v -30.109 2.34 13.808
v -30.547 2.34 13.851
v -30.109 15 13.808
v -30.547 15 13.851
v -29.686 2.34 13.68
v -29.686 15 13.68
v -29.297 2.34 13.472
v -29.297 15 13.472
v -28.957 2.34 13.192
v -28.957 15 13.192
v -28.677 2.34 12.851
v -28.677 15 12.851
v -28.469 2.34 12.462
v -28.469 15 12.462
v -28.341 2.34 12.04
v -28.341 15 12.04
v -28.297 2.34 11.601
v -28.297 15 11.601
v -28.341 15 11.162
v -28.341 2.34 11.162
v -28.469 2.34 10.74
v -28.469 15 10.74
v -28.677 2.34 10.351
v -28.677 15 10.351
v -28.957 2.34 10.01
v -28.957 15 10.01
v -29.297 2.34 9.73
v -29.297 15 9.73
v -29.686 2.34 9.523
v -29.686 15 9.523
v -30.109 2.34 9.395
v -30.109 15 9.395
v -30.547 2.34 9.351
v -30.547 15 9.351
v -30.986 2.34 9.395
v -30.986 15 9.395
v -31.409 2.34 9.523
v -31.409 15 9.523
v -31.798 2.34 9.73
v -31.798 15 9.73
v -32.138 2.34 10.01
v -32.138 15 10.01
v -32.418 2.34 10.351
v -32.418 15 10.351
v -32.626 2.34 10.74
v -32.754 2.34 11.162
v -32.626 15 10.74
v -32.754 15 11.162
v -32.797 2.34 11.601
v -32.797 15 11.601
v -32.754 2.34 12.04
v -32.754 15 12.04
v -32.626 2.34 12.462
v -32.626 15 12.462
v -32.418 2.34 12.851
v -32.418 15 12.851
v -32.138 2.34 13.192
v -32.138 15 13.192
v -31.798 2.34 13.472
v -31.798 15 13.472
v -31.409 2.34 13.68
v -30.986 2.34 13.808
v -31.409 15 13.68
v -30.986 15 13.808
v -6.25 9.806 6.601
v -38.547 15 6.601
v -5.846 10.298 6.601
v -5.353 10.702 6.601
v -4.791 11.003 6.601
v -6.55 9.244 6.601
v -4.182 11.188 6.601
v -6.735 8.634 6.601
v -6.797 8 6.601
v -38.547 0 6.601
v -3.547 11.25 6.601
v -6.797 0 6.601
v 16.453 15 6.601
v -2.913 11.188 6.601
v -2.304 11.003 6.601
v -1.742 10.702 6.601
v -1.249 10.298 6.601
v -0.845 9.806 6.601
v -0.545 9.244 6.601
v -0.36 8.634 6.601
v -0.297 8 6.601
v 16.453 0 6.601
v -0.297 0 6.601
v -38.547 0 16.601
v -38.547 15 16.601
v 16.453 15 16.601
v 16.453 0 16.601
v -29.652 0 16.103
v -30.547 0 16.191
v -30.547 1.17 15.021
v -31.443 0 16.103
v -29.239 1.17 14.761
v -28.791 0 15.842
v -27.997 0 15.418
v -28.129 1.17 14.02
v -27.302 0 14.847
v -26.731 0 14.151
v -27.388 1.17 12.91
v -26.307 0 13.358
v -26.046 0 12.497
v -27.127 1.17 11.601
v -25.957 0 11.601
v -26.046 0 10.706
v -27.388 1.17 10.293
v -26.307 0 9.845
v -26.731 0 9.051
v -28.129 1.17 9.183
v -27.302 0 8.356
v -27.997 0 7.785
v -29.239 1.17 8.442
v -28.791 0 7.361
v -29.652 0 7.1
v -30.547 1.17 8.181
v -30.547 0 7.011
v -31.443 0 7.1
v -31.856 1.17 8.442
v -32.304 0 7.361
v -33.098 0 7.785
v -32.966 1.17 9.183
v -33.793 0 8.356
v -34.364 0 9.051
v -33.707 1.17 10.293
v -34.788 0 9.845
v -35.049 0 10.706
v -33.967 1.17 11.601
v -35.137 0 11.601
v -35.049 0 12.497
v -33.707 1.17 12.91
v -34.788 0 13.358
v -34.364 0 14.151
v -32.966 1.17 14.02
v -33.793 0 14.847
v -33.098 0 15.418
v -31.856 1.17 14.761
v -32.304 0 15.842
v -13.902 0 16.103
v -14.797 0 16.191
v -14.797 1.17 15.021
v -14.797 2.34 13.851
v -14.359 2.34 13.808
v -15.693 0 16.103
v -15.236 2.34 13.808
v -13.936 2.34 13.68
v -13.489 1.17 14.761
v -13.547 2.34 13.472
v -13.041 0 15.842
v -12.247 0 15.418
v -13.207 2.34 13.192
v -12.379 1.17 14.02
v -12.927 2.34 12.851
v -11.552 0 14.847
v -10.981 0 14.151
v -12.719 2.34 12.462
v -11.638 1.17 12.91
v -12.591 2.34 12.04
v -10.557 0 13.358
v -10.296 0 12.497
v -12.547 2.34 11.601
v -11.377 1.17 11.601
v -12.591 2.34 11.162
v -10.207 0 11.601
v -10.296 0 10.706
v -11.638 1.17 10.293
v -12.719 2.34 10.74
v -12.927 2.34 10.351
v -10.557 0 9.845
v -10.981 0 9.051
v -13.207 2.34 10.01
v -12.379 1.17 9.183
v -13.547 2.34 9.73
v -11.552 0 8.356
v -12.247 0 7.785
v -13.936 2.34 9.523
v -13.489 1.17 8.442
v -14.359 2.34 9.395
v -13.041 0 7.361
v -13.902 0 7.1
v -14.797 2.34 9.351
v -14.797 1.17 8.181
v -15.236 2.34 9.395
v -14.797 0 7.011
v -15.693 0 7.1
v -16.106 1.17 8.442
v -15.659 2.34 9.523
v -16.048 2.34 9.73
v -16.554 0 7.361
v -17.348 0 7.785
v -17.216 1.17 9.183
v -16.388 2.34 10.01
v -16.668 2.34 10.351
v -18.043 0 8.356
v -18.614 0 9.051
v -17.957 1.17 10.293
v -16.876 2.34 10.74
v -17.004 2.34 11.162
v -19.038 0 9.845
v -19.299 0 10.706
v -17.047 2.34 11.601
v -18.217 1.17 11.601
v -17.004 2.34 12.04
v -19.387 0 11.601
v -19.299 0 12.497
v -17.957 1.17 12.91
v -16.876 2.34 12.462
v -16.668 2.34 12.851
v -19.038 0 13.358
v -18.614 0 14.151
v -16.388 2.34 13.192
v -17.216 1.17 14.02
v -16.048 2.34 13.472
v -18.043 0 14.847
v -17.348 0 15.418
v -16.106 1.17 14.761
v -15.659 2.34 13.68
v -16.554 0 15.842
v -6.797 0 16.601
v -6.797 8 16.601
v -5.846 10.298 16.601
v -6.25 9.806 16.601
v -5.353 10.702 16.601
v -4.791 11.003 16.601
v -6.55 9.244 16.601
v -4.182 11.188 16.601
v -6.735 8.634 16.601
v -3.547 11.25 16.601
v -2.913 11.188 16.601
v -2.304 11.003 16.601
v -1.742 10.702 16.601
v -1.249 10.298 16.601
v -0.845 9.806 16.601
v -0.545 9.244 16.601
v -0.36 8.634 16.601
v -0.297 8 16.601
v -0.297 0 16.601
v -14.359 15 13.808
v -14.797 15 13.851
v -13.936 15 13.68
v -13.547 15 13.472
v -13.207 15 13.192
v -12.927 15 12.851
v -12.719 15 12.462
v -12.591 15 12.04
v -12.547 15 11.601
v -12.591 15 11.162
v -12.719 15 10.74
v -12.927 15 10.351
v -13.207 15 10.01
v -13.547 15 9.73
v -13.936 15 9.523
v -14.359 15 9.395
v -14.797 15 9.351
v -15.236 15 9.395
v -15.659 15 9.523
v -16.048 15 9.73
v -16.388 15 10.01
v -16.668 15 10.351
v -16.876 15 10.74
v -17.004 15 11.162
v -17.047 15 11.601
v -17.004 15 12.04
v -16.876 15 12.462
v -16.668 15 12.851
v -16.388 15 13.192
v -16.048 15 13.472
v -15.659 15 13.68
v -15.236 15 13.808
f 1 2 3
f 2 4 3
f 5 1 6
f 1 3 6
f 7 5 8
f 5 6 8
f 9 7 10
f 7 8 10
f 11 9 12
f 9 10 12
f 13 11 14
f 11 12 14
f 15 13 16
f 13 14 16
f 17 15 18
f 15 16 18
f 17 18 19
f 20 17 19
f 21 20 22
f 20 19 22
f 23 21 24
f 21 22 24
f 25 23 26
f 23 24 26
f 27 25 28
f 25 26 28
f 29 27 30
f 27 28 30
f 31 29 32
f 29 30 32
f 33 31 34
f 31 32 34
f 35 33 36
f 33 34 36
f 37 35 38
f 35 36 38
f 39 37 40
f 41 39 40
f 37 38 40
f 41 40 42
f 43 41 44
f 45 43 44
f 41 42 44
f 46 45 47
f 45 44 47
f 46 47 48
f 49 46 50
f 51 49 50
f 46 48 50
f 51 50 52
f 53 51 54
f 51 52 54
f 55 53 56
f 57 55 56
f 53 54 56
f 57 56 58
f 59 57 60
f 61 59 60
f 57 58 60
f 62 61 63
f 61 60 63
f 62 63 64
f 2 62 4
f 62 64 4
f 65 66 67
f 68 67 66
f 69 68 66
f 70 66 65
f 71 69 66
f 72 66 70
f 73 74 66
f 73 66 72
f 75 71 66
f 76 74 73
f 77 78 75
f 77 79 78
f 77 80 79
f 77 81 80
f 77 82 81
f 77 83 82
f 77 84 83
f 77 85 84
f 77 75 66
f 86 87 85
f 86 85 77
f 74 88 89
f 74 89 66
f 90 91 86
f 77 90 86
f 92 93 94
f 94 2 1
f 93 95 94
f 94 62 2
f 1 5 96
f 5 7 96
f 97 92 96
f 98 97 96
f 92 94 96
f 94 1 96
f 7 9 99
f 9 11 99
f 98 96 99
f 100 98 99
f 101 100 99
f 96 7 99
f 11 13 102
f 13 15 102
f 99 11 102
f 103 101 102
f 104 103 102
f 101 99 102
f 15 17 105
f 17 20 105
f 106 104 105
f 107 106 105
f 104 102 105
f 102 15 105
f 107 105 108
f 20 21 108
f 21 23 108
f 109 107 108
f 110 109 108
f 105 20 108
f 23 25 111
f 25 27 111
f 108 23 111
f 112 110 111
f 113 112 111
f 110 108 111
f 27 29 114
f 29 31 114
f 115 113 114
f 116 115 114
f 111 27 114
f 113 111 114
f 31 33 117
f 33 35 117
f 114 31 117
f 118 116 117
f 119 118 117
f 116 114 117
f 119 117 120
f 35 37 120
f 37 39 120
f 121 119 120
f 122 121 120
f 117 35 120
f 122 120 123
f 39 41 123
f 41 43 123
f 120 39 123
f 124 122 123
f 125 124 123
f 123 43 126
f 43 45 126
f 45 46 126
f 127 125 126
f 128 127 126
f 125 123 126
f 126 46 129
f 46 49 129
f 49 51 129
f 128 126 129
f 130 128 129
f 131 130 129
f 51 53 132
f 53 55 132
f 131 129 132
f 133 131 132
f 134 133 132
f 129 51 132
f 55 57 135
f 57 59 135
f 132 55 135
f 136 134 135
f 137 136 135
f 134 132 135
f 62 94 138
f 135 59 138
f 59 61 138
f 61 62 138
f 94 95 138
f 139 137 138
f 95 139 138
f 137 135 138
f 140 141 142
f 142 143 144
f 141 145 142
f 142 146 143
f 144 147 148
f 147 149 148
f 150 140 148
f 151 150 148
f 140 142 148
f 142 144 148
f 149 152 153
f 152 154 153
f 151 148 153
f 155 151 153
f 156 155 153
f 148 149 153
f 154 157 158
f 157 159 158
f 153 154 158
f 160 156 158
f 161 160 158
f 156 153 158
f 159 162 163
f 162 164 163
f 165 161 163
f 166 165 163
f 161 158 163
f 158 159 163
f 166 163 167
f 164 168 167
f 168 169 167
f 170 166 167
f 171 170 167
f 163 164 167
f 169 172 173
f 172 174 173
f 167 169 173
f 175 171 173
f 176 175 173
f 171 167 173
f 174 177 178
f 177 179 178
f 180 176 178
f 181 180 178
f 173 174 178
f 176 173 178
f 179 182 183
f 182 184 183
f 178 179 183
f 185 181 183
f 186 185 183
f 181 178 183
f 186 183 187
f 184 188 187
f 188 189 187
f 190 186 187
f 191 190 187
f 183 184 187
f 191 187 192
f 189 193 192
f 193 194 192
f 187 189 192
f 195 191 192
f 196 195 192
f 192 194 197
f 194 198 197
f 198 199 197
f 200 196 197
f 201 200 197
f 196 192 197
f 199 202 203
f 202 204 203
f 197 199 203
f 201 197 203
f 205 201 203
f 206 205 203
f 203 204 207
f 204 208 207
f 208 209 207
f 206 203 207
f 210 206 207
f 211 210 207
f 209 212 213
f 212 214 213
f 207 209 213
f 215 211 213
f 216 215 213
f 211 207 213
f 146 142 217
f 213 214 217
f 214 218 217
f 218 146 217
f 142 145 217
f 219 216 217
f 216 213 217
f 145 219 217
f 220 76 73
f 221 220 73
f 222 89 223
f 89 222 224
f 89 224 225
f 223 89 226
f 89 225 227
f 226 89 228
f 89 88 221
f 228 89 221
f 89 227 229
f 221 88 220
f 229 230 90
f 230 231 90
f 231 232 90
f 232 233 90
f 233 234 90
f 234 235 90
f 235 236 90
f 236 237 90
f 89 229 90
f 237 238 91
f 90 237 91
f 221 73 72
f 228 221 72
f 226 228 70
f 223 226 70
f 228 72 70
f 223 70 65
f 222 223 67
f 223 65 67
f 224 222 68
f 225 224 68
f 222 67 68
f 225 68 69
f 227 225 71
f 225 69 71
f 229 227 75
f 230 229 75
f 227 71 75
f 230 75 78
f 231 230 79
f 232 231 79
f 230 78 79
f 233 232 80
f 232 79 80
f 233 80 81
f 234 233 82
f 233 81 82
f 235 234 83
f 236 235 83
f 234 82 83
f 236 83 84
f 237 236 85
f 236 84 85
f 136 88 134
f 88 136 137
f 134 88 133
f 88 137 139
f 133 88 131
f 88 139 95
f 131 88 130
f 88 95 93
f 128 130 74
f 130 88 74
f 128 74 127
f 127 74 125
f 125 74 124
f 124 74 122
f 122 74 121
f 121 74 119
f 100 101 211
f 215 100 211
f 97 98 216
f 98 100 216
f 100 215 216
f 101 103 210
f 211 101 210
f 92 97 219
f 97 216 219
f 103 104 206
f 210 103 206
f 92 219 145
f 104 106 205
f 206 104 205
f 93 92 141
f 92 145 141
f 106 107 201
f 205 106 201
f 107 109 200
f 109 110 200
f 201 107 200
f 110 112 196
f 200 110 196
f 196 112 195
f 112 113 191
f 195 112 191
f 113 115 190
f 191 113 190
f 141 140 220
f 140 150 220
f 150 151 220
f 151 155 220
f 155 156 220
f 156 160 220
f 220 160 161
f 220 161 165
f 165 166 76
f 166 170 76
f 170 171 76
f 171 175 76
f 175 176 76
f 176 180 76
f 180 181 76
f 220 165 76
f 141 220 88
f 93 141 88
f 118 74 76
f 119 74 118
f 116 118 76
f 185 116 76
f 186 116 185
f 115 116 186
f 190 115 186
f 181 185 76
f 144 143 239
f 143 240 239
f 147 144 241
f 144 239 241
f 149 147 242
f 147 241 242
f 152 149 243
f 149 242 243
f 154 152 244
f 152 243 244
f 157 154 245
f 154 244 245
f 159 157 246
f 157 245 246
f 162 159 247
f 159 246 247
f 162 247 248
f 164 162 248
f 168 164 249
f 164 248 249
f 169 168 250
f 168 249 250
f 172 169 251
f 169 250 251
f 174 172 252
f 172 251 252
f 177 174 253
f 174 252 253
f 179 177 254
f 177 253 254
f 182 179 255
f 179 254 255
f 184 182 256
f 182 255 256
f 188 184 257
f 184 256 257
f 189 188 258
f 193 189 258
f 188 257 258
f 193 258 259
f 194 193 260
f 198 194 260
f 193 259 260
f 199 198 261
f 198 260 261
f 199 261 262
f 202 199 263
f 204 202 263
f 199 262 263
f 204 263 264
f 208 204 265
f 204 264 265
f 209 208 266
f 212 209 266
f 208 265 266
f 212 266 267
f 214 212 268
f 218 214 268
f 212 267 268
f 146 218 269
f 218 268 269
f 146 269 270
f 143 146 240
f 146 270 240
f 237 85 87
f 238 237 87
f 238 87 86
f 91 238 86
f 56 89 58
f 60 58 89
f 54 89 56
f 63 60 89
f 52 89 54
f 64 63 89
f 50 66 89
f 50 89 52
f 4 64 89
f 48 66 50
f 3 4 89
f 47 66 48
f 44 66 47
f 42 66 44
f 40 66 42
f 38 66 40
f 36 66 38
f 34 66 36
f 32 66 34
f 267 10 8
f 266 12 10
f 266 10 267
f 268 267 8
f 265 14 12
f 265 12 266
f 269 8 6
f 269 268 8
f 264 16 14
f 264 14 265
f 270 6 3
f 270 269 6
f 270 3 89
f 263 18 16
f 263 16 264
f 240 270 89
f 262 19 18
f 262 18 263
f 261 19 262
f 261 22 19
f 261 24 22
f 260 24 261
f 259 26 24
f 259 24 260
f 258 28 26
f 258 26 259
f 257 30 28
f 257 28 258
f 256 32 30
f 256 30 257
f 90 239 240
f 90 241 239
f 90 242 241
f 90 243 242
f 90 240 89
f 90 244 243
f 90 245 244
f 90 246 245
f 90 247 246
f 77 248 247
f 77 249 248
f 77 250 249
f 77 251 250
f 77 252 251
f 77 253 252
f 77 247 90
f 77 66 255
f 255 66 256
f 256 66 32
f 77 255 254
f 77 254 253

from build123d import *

# Parameters (mm, degrees)
SKIZZE1_W                                            = 55
SKIZZE1_H                                            = 10
AUFSATZ_LINEAR_AUSTRAGEN1_DEPTH                      = 15
SCHNITT_LINEAR_AUSTRAGEN1_DEPTH                      = 15
SKIZZE3_R                                            = 1
SCHNITT_LINEAR_AUSTRAGEN2_DEPTH                      = 20
FORMSENKUNG_F_R_M4_SENKSCHRAUBE_MIT_INNE_D           = 4.5
FORMSENKUNG_F_R_M4_SENKSCHRAUBE_MIT_INNE_DEPTH       = 21.5
FORMSENKUNG_F_R_M4_SENKSCHRAUBE_MIT_INNE_CSINK_D     = 9.18
FORMSENKUNG_F_R_M4_SENKSCHRAUBE_MIT_INNE_CSINK_ANGLE = 90
FORMSENKUNG_F_R_M4_SENKSCHRAUBE_MIT_INNE_TIP         = 1.351936393


with BuildPart() as part:
    # Skizze1 → Aufsatz-Linear austragen1 (new body)
    with BuildSketch(Plane(origin=(0, 0, 0), x_dir=(1, 0, 0), z_dir=(0, 1, 0))):
        with Locations((-11.047495286, -11.601305052)):
            Rectangle(SKIZZE1_W, SKIZZE1_H)
    extrude(amount=AUFSATZ_LINEAR_AUSTRAGEN1_DEPTH)

    # Skizze2 → Schnitt-Linear austragen1 (cut)
    with BuildSketch(Plane(origin=(0, 0, 6.601305052), x_dir=(-1, 0, 0), z_dir=(0, 0, -1))):
        with BuildLine():
            Line((0.297495286, 8), (0.297495286, 0))
            Line((0.297495286, 0), (6.797495286, 0))
            Line((6.797495286, 0), (6.797495286, 8))
            ThreePointArc((6.797495286, 8), (3.547495286, 11.25), (0.297495286, 8))
        make_face()
    extrude(amount=-SCHNITT_LINEAR_AUSTRAGEN1_DEPTH, mode=Mode.SUBTRACT)

    # Skizze3 → Schnitt-Linear austragen2 (cut)
    with BuildSketch(Plane.XZ):
        with Locations(Location((-14.797495286, 11.601305052, 0), (0, 0, 270))):
            Circle(SKIZZE3_R)
        with Locations(Location((-30.547495286, 11.601305052, 0), (0, 0, 270))):
            Circle(SKIZZE3_R)
    extrude(amount=-SCHNITT_LINEAR_AUSTRAGEN2_DEPTH, mode=Mode.SUBTRACT)

    # Formsenkung für M4 Senkschraube mit Innensechskant1
    with Locations(Plane(origin=(-30.547495286, 0, 11.601305052), x_dir=(0, 0, -1), z_dir=(0, -1, 0))):
        with Locations((0, 0), (0, 15.75)):
            CounterSinkHole(FORMSENKUNG_F_R_M4_SENKSCHRAUBE_MIT_INNE_D / 2, FORMSENKUNG_F_R_M4_SENKSCHRAUBE_MIT_INNE_CSINK_D / 2, depth=FORMSENKUNG_F_R_M4_SENKSCHRAUBE_MIT_INNE_DEPTH, counter_sink_angle=FORMSENKUNG_F_R_M4_SENKSCHRAUBE_MIT_INNE_CSINK_ANGLE)
            with Locations((0, 0, -(FORMSENKUNG_F_R_M4_SENKSCHRAUBE_MIT_INNE_DEPTH + FORMSENKUNG_F_R_M4_SENKSCHRAUBE_MIT_INNE_TIP / 2))):  # 118° drill point
                Cone(0, FORMSENKUNG_F_R_M4_SENKSCHRAUBE_MIT_INNE_D / 2, FORMSENKUNG_F_R_M4_SENKSCHRAUBE_MIT_INNE_TIP, mode=Mode.SUBTRACT)


solid = part.part
